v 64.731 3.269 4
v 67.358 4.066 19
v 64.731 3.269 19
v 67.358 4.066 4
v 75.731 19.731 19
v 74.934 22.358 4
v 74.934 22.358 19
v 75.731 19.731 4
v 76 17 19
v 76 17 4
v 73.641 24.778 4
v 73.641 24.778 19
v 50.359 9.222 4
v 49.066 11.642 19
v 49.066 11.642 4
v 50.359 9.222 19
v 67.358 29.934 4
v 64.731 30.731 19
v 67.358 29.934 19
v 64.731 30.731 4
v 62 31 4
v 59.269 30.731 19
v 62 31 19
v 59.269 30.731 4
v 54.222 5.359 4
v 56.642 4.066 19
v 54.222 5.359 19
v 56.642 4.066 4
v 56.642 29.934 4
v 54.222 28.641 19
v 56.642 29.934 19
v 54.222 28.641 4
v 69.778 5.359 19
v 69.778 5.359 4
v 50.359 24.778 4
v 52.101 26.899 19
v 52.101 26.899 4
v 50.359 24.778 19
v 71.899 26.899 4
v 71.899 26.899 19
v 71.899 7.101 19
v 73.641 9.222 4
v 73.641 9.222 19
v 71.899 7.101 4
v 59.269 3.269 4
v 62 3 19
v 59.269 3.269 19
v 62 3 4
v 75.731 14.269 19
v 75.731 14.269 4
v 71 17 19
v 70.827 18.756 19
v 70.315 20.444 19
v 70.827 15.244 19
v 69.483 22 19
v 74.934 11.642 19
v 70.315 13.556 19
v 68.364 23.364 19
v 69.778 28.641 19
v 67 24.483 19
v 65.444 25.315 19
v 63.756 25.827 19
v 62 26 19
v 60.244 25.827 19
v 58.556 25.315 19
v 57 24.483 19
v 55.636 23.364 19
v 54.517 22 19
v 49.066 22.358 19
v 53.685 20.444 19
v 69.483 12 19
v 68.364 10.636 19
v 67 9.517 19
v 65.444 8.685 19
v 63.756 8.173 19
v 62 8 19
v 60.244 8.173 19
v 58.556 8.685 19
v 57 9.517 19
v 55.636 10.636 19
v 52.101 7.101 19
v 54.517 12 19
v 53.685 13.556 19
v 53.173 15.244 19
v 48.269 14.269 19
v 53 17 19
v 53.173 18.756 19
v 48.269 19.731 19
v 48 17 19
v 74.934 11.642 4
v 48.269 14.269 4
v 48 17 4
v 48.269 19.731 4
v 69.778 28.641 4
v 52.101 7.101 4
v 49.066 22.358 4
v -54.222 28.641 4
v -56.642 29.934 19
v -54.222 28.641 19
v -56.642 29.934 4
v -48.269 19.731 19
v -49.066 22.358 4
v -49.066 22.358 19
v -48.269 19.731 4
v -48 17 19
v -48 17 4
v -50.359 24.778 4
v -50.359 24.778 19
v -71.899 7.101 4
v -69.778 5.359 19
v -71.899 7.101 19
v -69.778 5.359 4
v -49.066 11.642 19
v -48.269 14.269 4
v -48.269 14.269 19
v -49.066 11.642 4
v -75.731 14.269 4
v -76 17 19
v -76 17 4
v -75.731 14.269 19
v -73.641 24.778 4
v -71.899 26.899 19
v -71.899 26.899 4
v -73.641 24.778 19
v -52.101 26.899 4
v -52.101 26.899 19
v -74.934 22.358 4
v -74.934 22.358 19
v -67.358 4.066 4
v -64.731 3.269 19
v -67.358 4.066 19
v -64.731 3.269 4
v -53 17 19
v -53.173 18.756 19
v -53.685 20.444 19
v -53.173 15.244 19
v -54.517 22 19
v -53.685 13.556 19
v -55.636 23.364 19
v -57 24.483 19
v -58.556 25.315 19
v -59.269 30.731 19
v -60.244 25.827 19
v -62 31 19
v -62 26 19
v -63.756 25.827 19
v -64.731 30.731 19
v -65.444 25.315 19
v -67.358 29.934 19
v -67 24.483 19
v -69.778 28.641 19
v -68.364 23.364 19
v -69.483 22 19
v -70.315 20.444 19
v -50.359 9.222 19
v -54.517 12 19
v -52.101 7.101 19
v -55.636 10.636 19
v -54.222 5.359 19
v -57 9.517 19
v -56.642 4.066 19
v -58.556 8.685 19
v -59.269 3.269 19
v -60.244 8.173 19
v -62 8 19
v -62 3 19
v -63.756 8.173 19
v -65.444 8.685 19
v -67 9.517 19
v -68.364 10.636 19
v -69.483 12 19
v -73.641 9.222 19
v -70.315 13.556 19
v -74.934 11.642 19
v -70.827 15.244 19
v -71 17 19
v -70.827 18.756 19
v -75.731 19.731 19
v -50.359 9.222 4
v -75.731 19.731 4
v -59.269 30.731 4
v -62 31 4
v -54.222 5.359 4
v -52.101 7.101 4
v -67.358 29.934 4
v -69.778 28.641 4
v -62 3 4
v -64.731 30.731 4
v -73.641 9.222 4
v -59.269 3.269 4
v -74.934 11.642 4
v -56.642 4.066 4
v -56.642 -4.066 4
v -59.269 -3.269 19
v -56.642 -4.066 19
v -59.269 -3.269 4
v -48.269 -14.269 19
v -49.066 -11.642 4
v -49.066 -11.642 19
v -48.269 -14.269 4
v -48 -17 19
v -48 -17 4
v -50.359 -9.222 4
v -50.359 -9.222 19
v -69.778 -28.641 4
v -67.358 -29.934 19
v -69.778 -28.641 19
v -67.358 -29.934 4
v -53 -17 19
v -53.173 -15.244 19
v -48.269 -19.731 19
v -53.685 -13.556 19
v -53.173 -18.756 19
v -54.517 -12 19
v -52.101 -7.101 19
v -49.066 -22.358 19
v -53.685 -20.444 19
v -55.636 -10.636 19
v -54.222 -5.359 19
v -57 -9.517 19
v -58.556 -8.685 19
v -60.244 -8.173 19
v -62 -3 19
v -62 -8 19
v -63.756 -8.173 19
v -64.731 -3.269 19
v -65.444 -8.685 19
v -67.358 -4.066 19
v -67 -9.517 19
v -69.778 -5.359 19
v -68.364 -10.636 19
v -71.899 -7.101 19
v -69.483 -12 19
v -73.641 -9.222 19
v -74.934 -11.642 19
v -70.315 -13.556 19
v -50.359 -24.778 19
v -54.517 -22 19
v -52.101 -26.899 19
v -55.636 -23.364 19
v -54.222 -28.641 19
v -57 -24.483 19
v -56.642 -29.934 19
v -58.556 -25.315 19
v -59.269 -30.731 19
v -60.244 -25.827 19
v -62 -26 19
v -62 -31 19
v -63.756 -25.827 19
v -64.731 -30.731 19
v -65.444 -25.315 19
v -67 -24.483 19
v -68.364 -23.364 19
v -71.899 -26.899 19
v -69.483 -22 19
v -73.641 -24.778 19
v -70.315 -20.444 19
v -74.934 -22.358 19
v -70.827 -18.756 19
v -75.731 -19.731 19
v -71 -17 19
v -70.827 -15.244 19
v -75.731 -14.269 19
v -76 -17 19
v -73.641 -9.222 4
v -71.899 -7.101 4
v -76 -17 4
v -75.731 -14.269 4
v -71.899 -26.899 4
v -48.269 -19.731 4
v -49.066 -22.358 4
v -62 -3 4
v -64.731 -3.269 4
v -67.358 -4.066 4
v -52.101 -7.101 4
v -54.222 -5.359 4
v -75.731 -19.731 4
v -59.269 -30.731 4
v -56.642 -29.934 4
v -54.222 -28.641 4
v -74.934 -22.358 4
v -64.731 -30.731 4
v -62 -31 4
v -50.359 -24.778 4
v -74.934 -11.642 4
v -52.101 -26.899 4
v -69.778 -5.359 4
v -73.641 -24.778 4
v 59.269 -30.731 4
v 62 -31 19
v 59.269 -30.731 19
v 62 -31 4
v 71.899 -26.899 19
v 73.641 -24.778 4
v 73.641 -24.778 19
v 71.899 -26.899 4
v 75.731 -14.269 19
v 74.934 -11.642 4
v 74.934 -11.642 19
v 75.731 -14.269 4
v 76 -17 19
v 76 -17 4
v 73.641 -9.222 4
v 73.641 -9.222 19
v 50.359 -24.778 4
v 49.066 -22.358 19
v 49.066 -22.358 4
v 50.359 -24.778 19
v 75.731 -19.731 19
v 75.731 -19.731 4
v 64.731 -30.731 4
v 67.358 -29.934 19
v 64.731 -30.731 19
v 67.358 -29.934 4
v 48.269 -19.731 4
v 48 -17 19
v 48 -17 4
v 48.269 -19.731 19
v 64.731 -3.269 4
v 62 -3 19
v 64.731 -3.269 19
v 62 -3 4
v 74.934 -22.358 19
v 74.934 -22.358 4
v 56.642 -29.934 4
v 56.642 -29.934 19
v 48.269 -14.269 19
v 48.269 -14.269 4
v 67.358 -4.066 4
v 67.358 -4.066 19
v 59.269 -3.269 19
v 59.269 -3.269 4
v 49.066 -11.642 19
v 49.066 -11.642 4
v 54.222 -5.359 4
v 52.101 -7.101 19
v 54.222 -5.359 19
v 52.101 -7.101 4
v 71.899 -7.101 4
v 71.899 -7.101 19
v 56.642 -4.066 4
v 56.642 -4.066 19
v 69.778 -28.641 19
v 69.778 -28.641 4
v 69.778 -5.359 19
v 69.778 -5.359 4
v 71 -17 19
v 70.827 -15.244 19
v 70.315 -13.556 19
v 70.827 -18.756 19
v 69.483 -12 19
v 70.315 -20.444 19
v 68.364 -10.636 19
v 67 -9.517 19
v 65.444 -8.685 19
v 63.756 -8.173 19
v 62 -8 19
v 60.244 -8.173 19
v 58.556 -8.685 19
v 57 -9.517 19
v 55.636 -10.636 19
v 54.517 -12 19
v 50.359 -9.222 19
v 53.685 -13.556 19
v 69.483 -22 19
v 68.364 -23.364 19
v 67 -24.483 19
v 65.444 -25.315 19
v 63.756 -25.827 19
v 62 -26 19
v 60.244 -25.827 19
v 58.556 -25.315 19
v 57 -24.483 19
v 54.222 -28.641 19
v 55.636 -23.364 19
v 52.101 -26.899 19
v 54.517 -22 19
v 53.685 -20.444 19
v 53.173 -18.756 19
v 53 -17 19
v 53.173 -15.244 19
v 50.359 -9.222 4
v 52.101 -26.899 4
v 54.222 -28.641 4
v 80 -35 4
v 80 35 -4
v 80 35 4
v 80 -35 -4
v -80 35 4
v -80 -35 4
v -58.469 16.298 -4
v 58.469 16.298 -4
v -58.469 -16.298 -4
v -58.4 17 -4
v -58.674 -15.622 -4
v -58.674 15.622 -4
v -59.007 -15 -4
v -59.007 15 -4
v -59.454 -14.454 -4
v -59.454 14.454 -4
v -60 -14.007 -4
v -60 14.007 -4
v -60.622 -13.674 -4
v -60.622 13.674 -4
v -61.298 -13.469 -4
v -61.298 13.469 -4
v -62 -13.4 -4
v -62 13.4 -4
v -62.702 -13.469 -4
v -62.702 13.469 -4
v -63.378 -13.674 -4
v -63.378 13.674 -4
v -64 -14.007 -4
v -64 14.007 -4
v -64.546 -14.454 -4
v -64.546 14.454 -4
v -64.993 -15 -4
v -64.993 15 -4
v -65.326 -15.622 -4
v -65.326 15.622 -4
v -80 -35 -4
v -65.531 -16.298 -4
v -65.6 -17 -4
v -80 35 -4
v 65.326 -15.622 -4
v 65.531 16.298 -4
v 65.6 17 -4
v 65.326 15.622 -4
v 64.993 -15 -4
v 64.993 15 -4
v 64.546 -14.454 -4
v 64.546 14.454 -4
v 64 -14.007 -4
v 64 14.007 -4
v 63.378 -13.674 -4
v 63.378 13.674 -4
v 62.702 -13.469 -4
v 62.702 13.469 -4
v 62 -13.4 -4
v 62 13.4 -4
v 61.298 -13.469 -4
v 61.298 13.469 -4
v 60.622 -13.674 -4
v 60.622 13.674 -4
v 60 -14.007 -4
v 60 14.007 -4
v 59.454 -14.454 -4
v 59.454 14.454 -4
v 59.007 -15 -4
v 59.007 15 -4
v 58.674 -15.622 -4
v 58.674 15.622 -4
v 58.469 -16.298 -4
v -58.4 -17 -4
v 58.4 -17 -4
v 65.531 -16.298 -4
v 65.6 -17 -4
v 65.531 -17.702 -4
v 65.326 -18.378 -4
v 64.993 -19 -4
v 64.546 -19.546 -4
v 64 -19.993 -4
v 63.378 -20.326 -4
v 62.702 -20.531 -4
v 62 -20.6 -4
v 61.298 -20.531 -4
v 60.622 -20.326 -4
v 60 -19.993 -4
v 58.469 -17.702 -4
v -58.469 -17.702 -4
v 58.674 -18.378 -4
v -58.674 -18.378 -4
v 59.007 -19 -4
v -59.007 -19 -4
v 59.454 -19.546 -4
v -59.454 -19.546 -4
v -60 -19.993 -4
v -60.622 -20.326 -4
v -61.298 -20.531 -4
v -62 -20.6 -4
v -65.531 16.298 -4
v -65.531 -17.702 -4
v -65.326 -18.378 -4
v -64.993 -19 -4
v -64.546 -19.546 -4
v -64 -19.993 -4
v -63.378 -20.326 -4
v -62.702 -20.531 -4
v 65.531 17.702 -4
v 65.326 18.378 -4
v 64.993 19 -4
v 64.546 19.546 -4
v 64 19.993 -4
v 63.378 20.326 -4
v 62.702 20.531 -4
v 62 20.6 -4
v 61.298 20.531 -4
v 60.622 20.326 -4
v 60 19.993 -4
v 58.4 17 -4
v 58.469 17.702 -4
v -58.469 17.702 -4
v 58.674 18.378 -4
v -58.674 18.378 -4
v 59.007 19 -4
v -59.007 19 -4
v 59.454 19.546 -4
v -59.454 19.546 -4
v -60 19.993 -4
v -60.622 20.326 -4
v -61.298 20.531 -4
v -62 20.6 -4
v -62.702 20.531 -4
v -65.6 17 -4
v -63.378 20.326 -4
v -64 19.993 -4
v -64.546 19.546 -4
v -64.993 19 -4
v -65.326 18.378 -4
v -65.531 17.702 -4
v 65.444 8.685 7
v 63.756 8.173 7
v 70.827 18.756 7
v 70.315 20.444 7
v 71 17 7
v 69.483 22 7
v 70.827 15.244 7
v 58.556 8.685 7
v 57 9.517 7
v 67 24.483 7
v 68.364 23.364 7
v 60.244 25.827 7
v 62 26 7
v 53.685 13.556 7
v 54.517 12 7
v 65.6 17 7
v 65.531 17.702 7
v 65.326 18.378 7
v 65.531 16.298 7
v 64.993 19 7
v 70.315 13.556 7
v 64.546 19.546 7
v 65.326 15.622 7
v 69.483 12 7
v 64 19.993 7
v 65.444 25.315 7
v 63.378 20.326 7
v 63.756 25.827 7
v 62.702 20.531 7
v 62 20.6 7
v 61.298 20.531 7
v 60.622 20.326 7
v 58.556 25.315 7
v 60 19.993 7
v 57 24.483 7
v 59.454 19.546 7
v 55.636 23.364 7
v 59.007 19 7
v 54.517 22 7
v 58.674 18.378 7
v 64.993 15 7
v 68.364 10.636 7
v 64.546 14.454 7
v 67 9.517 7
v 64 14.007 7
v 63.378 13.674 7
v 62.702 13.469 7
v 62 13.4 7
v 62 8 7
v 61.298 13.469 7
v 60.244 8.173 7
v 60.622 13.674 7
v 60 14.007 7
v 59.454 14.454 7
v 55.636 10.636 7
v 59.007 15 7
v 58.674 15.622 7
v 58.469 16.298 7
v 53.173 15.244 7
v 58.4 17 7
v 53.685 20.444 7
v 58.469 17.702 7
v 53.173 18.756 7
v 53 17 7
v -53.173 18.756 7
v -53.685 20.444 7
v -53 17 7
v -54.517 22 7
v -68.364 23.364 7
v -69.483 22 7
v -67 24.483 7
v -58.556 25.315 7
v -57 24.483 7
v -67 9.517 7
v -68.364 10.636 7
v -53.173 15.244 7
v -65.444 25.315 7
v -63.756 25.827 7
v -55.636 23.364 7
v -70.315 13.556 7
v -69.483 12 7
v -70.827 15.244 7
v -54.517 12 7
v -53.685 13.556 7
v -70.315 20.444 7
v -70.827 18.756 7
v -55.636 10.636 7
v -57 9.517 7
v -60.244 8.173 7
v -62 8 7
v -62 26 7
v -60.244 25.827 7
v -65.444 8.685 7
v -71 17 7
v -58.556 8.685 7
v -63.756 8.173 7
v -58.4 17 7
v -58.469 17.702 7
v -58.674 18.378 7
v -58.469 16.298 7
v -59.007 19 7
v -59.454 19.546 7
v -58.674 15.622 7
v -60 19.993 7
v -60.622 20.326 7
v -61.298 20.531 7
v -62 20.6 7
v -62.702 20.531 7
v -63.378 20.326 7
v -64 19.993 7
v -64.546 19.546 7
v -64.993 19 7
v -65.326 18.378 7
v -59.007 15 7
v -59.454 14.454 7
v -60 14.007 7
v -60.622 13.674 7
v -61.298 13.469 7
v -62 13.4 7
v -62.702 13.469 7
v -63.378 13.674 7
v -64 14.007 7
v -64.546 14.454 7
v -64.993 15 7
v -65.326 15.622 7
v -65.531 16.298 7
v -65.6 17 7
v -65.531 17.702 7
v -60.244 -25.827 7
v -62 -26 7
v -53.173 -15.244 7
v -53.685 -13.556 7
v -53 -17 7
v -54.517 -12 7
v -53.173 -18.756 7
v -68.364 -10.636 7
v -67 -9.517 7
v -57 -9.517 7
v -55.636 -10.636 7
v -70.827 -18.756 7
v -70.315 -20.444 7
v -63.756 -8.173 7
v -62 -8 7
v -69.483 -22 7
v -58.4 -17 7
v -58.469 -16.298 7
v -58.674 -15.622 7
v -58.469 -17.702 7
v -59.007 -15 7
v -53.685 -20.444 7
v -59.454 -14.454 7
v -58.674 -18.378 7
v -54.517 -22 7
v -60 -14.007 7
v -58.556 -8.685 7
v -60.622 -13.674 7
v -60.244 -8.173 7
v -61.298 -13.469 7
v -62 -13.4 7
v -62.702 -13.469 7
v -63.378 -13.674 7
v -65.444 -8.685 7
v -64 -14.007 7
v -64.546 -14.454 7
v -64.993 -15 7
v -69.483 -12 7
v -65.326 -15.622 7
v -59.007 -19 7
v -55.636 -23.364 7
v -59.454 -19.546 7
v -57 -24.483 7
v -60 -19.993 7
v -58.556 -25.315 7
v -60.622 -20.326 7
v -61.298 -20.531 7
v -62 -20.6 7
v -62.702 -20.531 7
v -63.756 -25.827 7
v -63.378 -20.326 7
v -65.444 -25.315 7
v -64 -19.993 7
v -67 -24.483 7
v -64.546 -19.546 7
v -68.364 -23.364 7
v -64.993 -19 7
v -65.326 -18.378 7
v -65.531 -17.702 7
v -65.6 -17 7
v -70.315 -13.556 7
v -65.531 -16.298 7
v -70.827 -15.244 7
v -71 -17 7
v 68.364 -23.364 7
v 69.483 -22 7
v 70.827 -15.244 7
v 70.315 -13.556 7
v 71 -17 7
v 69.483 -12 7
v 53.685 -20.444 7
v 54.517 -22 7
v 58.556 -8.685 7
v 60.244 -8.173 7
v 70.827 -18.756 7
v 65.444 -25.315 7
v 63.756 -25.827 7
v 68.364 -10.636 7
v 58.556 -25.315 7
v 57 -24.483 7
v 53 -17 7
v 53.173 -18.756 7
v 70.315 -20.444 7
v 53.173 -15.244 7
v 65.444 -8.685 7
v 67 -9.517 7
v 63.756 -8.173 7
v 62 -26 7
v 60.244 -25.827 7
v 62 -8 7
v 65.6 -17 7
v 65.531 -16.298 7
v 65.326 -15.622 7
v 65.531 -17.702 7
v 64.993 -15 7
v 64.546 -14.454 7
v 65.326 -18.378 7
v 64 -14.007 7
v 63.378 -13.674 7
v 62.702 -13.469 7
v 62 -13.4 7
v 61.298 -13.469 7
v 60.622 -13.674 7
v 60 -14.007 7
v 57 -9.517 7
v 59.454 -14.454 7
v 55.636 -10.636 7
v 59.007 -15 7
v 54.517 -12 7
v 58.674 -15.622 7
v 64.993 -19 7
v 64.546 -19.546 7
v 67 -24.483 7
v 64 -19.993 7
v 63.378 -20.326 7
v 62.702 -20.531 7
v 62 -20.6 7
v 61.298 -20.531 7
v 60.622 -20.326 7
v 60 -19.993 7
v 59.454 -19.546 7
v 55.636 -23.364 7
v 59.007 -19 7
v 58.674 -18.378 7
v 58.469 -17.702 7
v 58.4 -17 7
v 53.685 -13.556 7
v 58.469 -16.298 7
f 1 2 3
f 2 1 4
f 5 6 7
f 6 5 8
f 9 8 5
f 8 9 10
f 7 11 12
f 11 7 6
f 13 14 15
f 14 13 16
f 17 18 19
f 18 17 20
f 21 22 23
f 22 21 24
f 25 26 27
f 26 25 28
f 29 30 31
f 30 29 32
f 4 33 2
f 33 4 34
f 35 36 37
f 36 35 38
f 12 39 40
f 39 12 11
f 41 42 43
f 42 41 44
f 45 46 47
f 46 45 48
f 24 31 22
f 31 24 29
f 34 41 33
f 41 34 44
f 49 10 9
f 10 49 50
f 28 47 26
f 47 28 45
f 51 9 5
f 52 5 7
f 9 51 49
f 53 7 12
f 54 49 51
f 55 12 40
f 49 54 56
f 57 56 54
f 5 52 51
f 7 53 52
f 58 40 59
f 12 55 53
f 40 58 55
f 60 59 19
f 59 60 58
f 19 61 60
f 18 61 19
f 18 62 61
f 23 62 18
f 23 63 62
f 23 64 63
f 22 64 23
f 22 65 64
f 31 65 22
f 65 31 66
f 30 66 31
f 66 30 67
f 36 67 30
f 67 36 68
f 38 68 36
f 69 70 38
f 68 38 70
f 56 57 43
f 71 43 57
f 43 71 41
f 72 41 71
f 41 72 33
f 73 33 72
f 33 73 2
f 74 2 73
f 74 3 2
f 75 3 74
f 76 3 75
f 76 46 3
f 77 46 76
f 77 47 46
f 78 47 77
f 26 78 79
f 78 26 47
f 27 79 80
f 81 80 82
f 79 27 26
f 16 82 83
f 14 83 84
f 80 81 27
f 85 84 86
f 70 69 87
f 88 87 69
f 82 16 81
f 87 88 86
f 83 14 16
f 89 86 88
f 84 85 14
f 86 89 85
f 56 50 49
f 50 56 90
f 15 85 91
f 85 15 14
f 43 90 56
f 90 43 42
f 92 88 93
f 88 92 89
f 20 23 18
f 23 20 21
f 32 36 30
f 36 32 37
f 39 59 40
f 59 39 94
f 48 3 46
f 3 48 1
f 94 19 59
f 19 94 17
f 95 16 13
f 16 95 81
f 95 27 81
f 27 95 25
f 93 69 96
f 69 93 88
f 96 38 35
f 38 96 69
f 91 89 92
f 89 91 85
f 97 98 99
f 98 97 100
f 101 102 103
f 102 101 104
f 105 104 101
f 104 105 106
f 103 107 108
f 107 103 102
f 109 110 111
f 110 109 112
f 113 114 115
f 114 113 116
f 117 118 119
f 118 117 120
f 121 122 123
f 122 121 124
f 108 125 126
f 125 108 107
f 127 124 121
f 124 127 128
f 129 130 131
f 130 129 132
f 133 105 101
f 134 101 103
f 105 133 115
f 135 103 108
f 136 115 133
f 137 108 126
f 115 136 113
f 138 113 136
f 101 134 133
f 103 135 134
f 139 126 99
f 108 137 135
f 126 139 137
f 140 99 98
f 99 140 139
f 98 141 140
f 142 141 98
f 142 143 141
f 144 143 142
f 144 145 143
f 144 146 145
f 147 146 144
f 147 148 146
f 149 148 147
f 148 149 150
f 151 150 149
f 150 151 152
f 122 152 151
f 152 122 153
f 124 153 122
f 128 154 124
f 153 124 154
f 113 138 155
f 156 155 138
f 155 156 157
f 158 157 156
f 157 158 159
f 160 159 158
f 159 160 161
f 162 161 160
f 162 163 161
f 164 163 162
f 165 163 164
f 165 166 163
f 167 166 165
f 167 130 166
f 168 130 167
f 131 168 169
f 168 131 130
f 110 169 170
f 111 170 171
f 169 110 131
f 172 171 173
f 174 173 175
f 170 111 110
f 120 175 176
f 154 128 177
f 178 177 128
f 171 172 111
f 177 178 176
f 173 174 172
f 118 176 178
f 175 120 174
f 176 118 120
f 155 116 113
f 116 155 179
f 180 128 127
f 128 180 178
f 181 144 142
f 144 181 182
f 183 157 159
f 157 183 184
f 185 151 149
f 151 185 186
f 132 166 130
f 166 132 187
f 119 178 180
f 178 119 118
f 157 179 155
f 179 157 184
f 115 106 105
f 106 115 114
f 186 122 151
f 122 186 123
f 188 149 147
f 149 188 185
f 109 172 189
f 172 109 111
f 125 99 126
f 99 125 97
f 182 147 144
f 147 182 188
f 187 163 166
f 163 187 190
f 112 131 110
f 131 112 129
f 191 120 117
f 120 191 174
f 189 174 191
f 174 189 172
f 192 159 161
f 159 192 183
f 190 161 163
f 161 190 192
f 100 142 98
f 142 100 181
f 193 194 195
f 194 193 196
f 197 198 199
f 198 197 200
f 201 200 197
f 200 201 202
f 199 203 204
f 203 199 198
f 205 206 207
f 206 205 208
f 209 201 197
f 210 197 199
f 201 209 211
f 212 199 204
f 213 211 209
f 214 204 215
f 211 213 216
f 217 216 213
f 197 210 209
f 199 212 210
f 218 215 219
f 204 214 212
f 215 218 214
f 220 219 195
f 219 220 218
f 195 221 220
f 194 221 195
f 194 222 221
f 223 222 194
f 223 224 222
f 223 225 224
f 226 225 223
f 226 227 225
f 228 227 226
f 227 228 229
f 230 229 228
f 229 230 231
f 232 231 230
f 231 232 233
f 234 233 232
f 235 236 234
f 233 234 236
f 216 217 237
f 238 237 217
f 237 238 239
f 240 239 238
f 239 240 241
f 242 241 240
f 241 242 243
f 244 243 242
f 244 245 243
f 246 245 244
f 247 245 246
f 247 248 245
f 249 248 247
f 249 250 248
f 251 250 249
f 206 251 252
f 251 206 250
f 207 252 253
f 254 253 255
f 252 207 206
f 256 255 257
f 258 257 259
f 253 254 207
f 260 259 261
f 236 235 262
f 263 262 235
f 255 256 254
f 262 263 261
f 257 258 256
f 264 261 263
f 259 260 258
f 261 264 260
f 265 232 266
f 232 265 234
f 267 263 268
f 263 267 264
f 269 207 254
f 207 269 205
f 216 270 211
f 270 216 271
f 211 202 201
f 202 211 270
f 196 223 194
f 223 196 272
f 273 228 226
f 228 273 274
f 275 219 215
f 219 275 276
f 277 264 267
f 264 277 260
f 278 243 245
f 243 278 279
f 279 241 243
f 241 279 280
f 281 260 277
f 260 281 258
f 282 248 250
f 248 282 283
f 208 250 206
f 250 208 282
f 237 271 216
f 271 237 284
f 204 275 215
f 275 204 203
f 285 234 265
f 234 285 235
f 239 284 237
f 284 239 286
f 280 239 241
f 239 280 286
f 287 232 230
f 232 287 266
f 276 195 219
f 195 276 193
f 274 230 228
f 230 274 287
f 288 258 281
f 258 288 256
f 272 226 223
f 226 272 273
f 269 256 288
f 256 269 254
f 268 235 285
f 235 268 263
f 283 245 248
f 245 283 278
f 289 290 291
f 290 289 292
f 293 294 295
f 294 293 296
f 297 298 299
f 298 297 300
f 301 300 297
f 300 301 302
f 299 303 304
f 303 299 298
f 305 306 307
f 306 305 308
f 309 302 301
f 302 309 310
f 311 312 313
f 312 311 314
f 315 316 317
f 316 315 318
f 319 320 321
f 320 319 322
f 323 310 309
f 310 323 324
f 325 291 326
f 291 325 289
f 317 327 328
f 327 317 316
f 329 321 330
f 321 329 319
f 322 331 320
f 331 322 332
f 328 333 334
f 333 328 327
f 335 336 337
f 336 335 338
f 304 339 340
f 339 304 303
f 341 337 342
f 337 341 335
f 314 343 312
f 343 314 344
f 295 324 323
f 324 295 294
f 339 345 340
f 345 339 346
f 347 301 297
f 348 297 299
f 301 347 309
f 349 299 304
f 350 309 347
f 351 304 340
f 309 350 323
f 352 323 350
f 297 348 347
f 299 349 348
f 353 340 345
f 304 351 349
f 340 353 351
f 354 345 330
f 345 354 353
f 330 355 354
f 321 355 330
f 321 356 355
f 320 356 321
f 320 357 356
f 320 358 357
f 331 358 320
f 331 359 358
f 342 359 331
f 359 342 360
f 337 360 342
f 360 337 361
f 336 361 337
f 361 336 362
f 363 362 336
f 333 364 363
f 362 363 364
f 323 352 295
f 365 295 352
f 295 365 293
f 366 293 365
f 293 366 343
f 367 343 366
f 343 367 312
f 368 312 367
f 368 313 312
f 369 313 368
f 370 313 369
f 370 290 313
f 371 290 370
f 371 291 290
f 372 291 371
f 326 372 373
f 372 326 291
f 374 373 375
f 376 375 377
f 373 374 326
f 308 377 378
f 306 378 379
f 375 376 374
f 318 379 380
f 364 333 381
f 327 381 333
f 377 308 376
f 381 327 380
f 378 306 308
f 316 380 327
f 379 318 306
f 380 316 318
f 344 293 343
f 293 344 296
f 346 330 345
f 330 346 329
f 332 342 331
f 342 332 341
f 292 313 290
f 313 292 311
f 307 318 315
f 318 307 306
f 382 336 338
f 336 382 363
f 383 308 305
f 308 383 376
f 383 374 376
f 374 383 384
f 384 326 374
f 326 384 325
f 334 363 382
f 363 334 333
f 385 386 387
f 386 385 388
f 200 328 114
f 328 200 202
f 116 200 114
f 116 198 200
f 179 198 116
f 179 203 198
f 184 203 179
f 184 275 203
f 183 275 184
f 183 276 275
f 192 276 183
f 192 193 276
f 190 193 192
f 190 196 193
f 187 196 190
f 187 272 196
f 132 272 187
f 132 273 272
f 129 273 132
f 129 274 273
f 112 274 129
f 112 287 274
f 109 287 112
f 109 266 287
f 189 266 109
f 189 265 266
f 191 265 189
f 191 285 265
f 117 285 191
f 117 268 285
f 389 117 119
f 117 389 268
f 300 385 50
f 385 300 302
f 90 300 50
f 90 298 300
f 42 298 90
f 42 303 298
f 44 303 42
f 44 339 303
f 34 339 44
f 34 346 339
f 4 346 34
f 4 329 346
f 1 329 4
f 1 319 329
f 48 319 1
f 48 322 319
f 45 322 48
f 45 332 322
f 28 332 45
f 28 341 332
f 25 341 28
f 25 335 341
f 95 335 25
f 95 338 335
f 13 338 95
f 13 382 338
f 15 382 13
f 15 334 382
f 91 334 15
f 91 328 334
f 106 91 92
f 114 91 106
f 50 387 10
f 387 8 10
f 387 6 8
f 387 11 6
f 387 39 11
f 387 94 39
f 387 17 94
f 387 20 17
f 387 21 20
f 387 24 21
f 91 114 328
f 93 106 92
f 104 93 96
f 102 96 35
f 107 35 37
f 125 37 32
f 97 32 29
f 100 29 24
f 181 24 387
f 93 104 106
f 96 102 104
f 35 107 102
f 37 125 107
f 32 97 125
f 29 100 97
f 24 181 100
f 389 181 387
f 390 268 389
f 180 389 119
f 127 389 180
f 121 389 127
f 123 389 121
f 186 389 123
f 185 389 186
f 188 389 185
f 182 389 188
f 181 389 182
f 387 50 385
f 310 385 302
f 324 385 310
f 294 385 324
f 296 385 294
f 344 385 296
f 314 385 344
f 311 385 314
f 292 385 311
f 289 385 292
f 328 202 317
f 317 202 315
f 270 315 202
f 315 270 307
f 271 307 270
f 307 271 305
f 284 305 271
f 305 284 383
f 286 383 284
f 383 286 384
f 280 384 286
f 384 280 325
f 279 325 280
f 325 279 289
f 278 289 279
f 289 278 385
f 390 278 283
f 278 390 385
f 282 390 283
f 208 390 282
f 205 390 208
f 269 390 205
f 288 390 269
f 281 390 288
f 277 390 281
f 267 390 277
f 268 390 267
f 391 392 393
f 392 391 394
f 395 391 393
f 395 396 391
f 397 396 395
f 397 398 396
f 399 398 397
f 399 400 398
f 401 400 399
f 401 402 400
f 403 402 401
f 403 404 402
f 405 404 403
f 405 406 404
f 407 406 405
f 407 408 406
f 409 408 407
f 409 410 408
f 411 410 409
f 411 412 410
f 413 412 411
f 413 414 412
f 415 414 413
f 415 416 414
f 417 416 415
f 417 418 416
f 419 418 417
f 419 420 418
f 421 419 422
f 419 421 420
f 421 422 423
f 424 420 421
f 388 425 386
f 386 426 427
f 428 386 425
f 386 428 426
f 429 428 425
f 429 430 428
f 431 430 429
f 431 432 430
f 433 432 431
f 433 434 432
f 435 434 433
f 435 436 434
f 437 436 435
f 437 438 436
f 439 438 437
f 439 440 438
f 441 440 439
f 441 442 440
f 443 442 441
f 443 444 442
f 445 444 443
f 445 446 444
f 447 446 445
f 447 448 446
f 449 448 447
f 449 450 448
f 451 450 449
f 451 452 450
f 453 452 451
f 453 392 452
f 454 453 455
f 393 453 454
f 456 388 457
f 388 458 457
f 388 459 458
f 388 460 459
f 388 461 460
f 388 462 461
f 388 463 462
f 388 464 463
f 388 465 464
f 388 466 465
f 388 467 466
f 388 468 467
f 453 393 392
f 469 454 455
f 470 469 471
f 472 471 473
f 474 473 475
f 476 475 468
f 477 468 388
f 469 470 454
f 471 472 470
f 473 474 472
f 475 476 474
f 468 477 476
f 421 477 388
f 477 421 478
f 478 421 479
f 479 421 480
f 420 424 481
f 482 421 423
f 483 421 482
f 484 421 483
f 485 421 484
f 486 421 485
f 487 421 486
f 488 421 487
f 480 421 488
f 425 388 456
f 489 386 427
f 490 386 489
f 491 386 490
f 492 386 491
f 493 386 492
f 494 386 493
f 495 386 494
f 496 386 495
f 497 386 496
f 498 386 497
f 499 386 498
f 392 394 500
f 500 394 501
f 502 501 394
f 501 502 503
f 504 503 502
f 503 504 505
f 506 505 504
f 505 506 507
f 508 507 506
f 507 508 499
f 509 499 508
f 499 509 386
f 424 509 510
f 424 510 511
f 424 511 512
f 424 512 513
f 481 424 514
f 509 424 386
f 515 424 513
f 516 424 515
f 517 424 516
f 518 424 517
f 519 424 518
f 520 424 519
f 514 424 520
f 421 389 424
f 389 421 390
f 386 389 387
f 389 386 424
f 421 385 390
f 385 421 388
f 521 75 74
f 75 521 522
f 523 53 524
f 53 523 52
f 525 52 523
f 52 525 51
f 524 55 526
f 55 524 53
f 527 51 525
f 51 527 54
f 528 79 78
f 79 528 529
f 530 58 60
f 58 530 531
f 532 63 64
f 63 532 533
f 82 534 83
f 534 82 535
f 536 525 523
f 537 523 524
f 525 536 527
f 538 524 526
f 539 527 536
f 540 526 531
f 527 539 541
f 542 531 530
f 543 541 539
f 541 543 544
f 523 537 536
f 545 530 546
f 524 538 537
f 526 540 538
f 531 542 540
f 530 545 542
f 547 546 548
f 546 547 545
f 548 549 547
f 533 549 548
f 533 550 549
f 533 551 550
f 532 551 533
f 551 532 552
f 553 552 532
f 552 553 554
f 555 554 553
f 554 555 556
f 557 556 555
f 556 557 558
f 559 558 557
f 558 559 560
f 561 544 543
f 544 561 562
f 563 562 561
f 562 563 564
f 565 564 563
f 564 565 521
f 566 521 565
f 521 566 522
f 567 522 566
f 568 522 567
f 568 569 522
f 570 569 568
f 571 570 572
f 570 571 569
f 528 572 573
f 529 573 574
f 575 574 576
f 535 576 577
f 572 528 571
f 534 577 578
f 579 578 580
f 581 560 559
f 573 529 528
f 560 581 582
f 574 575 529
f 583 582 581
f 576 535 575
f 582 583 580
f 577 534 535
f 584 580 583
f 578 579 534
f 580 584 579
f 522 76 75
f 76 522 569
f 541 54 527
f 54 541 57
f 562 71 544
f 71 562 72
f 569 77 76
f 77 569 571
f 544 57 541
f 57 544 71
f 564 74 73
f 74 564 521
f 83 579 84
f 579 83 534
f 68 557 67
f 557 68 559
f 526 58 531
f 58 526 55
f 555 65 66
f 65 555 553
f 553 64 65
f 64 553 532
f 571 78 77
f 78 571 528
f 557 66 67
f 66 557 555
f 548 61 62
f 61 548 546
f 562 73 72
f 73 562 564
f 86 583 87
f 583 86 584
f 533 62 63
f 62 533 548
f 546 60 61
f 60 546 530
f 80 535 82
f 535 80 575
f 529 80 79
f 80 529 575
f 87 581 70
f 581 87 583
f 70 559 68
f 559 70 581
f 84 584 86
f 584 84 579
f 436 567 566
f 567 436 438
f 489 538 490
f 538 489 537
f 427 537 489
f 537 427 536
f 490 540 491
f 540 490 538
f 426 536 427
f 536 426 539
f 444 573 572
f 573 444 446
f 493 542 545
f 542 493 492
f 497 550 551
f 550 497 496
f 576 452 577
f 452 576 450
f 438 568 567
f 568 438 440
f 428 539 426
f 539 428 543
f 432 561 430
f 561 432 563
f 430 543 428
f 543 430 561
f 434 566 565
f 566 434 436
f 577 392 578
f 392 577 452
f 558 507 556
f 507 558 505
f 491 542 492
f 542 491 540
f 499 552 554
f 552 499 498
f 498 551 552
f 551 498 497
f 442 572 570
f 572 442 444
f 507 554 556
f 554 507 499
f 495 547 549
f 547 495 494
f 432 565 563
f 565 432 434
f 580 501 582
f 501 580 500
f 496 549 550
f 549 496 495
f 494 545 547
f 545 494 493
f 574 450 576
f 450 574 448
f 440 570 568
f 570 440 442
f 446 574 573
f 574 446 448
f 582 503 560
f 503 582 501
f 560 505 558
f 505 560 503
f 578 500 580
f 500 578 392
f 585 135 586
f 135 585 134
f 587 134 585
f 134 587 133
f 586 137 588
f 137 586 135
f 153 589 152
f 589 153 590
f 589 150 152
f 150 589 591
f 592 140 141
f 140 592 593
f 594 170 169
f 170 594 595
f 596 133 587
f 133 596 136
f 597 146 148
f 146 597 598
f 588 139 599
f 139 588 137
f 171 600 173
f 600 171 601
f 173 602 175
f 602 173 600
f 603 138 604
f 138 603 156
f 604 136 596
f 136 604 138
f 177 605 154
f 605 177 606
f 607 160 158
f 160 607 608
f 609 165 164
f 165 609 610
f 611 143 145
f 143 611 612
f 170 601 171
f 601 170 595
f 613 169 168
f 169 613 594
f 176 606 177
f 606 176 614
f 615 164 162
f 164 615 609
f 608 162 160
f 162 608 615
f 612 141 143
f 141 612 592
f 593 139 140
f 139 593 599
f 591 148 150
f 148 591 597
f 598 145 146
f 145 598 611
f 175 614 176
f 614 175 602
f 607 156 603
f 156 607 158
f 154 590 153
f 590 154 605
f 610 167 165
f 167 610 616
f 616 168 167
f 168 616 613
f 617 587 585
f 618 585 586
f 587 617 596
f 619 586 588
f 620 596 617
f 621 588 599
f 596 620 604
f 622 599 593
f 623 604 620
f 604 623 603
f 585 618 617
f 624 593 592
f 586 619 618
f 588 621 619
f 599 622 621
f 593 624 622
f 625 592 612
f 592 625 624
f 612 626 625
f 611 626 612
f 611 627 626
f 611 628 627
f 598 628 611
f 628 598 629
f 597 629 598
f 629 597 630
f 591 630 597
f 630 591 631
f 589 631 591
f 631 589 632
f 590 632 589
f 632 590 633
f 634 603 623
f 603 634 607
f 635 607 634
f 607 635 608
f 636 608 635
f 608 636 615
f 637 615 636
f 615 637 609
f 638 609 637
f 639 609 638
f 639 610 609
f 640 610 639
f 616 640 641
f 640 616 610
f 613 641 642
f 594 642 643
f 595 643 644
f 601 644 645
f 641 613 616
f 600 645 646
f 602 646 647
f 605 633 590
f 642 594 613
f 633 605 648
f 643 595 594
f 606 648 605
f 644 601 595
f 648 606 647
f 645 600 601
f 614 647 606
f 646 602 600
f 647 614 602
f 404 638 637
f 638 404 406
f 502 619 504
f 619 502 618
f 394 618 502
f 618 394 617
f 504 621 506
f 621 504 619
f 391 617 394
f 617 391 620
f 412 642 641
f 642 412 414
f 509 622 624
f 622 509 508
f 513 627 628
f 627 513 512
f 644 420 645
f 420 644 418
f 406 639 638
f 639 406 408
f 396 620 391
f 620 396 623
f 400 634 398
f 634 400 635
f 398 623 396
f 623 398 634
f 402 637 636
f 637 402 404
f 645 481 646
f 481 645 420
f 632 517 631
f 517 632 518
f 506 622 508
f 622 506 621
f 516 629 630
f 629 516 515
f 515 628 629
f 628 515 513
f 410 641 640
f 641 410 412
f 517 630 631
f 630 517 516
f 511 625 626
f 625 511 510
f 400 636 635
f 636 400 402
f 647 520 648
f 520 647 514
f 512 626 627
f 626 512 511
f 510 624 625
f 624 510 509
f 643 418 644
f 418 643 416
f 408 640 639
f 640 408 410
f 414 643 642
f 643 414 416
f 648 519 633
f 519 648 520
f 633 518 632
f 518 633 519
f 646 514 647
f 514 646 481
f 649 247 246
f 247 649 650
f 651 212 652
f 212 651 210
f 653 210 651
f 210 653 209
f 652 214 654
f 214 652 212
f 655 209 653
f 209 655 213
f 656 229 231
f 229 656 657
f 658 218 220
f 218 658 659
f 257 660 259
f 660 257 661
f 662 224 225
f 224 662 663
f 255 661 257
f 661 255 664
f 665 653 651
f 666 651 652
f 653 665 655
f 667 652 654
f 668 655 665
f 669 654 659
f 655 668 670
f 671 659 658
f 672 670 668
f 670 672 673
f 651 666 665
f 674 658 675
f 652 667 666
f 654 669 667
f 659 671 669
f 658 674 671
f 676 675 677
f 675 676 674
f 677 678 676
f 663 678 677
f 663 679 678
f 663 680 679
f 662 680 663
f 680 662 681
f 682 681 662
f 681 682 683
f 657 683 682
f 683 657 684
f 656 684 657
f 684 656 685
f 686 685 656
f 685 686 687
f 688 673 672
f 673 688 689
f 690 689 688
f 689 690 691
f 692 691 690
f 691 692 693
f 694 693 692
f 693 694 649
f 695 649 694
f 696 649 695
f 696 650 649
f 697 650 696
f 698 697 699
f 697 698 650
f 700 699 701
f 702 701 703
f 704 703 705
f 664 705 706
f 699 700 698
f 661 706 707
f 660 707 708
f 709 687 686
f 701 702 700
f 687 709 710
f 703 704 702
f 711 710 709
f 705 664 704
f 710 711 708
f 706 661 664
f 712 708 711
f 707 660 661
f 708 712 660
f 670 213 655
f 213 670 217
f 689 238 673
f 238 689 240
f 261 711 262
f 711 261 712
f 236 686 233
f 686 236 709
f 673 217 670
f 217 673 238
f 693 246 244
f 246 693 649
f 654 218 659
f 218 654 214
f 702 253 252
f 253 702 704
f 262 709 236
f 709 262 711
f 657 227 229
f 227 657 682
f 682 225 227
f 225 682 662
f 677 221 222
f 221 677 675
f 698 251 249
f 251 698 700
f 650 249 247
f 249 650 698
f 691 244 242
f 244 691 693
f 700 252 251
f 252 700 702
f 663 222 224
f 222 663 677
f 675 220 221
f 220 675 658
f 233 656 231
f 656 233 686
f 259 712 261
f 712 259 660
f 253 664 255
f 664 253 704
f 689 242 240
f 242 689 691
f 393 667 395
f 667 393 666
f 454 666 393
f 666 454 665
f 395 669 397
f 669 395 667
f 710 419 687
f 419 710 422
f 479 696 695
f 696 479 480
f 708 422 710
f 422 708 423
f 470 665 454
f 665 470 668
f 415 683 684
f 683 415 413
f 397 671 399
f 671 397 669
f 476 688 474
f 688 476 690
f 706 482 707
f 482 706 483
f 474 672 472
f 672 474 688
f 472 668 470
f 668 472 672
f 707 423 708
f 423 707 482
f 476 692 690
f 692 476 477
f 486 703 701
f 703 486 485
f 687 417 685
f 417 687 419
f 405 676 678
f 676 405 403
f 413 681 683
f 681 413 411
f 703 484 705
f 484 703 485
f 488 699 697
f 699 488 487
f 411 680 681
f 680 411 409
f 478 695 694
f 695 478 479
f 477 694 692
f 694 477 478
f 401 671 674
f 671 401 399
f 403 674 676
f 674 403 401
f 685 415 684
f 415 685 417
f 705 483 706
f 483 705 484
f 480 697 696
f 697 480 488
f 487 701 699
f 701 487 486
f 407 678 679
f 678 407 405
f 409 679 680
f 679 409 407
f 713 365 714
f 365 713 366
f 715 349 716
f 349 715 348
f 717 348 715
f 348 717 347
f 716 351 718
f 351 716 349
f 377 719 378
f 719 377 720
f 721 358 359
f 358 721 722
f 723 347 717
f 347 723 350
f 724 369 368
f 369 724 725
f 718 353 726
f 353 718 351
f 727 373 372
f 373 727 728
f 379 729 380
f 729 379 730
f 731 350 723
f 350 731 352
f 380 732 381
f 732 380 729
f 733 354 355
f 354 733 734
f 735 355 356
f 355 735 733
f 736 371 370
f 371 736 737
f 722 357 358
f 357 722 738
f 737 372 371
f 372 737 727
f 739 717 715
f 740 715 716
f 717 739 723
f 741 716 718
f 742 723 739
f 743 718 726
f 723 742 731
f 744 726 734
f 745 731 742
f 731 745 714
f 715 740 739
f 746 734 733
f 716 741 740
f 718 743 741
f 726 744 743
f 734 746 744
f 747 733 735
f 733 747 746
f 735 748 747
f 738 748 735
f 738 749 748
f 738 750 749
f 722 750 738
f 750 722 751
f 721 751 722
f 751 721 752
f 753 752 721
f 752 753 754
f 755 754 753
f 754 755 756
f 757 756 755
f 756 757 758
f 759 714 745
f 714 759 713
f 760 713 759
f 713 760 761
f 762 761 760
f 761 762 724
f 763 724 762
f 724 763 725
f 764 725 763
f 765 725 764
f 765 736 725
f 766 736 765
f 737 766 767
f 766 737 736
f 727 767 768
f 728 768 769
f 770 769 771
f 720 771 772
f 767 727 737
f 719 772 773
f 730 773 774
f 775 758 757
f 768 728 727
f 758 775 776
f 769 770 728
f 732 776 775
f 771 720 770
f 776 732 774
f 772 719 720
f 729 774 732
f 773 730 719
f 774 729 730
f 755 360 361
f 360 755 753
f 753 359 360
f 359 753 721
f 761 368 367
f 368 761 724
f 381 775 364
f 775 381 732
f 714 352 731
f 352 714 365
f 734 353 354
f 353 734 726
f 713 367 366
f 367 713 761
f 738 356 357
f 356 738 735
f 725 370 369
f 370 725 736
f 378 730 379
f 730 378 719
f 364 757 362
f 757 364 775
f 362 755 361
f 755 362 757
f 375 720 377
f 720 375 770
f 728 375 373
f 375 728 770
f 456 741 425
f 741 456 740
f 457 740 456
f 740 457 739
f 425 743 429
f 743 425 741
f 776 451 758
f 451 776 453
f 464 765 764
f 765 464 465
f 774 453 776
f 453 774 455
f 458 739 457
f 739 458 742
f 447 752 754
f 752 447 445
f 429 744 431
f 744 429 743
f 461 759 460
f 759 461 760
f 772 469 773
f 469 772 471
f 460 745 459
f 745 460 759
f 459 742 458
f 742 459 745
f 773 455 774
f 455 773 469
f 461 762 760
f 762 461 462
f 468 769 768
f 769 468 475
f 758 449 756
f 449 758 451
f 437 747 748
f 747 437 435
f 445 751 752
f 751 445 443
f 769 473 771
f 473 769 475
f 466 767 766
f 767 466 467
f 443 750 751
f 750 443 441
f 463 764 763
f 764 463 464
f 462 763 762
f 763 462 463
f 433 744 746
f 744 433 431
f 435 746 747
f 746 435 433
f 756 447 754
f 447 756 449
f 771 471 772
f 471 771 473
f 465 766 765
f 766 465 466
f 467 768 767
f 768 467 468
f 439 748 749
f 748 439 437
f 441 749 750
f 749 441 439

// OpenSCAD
$fn = 32;

// ----------------------------------------------------------------------
// Socket pad plate
// bosses with counterbored sockets for the screws
// ----------------------------------------------------------------------

// --- parameters (mm) ---
base_t = 8;            // base plate thickness
boss_h = 15;           // boss height above the base plate
boss_d = 28;           // boss diameter
socket_d = 18;         // socket diameter
socket_depth = 12;     // socket depth from the boss face
bolt_d = 7.2;          // screw clearance hole through the socket floor
plate = [160, 70, 8];  // overall size (x, y, z)
edge = 18;             // boss centre offset from the plate edge
pads = 4;              // boss count, one per corner

// --- derived feature positions (mm) ---
height = base_t + boss_h;        // = 23   overall height of the part
corner_x = plate[0] / 2 - edge;  // = 62   boss centre X
corner_y = plate[1] / 2 - edge;  // = 17   boss centre Y
feature_centers = [
  [corner_x, corner_y],
  [-corner_x, corner_y],
  [-corner_x, -corner_y],
  [corner_x, -corner_y]
];   // boss centres: sockets, holes and the pads themselves are placed from here

// base plate, bosses on feature_centers, socket + through hole in each
difference() {
  union() {
    cube(plate, center = true);
    for (centre = feature_centers)
      translate([centre[0], centre[1], plate[2] / 2 - 1])
        cylinder(d = boss_d, h = boss_h + 1);
  }
  for (centre = feature_centers) {
    translate([centre[0], centre[1], plate[2] / 2 + boss_h - socket_depth])
      cylinder(d = socket_d, h = socket_depth + 1);
    translate([centre[0], centre[1], -height])
      cylinder(d = bolt_d, h = 2 * height + 2);  // through the socket floor
  }
}
